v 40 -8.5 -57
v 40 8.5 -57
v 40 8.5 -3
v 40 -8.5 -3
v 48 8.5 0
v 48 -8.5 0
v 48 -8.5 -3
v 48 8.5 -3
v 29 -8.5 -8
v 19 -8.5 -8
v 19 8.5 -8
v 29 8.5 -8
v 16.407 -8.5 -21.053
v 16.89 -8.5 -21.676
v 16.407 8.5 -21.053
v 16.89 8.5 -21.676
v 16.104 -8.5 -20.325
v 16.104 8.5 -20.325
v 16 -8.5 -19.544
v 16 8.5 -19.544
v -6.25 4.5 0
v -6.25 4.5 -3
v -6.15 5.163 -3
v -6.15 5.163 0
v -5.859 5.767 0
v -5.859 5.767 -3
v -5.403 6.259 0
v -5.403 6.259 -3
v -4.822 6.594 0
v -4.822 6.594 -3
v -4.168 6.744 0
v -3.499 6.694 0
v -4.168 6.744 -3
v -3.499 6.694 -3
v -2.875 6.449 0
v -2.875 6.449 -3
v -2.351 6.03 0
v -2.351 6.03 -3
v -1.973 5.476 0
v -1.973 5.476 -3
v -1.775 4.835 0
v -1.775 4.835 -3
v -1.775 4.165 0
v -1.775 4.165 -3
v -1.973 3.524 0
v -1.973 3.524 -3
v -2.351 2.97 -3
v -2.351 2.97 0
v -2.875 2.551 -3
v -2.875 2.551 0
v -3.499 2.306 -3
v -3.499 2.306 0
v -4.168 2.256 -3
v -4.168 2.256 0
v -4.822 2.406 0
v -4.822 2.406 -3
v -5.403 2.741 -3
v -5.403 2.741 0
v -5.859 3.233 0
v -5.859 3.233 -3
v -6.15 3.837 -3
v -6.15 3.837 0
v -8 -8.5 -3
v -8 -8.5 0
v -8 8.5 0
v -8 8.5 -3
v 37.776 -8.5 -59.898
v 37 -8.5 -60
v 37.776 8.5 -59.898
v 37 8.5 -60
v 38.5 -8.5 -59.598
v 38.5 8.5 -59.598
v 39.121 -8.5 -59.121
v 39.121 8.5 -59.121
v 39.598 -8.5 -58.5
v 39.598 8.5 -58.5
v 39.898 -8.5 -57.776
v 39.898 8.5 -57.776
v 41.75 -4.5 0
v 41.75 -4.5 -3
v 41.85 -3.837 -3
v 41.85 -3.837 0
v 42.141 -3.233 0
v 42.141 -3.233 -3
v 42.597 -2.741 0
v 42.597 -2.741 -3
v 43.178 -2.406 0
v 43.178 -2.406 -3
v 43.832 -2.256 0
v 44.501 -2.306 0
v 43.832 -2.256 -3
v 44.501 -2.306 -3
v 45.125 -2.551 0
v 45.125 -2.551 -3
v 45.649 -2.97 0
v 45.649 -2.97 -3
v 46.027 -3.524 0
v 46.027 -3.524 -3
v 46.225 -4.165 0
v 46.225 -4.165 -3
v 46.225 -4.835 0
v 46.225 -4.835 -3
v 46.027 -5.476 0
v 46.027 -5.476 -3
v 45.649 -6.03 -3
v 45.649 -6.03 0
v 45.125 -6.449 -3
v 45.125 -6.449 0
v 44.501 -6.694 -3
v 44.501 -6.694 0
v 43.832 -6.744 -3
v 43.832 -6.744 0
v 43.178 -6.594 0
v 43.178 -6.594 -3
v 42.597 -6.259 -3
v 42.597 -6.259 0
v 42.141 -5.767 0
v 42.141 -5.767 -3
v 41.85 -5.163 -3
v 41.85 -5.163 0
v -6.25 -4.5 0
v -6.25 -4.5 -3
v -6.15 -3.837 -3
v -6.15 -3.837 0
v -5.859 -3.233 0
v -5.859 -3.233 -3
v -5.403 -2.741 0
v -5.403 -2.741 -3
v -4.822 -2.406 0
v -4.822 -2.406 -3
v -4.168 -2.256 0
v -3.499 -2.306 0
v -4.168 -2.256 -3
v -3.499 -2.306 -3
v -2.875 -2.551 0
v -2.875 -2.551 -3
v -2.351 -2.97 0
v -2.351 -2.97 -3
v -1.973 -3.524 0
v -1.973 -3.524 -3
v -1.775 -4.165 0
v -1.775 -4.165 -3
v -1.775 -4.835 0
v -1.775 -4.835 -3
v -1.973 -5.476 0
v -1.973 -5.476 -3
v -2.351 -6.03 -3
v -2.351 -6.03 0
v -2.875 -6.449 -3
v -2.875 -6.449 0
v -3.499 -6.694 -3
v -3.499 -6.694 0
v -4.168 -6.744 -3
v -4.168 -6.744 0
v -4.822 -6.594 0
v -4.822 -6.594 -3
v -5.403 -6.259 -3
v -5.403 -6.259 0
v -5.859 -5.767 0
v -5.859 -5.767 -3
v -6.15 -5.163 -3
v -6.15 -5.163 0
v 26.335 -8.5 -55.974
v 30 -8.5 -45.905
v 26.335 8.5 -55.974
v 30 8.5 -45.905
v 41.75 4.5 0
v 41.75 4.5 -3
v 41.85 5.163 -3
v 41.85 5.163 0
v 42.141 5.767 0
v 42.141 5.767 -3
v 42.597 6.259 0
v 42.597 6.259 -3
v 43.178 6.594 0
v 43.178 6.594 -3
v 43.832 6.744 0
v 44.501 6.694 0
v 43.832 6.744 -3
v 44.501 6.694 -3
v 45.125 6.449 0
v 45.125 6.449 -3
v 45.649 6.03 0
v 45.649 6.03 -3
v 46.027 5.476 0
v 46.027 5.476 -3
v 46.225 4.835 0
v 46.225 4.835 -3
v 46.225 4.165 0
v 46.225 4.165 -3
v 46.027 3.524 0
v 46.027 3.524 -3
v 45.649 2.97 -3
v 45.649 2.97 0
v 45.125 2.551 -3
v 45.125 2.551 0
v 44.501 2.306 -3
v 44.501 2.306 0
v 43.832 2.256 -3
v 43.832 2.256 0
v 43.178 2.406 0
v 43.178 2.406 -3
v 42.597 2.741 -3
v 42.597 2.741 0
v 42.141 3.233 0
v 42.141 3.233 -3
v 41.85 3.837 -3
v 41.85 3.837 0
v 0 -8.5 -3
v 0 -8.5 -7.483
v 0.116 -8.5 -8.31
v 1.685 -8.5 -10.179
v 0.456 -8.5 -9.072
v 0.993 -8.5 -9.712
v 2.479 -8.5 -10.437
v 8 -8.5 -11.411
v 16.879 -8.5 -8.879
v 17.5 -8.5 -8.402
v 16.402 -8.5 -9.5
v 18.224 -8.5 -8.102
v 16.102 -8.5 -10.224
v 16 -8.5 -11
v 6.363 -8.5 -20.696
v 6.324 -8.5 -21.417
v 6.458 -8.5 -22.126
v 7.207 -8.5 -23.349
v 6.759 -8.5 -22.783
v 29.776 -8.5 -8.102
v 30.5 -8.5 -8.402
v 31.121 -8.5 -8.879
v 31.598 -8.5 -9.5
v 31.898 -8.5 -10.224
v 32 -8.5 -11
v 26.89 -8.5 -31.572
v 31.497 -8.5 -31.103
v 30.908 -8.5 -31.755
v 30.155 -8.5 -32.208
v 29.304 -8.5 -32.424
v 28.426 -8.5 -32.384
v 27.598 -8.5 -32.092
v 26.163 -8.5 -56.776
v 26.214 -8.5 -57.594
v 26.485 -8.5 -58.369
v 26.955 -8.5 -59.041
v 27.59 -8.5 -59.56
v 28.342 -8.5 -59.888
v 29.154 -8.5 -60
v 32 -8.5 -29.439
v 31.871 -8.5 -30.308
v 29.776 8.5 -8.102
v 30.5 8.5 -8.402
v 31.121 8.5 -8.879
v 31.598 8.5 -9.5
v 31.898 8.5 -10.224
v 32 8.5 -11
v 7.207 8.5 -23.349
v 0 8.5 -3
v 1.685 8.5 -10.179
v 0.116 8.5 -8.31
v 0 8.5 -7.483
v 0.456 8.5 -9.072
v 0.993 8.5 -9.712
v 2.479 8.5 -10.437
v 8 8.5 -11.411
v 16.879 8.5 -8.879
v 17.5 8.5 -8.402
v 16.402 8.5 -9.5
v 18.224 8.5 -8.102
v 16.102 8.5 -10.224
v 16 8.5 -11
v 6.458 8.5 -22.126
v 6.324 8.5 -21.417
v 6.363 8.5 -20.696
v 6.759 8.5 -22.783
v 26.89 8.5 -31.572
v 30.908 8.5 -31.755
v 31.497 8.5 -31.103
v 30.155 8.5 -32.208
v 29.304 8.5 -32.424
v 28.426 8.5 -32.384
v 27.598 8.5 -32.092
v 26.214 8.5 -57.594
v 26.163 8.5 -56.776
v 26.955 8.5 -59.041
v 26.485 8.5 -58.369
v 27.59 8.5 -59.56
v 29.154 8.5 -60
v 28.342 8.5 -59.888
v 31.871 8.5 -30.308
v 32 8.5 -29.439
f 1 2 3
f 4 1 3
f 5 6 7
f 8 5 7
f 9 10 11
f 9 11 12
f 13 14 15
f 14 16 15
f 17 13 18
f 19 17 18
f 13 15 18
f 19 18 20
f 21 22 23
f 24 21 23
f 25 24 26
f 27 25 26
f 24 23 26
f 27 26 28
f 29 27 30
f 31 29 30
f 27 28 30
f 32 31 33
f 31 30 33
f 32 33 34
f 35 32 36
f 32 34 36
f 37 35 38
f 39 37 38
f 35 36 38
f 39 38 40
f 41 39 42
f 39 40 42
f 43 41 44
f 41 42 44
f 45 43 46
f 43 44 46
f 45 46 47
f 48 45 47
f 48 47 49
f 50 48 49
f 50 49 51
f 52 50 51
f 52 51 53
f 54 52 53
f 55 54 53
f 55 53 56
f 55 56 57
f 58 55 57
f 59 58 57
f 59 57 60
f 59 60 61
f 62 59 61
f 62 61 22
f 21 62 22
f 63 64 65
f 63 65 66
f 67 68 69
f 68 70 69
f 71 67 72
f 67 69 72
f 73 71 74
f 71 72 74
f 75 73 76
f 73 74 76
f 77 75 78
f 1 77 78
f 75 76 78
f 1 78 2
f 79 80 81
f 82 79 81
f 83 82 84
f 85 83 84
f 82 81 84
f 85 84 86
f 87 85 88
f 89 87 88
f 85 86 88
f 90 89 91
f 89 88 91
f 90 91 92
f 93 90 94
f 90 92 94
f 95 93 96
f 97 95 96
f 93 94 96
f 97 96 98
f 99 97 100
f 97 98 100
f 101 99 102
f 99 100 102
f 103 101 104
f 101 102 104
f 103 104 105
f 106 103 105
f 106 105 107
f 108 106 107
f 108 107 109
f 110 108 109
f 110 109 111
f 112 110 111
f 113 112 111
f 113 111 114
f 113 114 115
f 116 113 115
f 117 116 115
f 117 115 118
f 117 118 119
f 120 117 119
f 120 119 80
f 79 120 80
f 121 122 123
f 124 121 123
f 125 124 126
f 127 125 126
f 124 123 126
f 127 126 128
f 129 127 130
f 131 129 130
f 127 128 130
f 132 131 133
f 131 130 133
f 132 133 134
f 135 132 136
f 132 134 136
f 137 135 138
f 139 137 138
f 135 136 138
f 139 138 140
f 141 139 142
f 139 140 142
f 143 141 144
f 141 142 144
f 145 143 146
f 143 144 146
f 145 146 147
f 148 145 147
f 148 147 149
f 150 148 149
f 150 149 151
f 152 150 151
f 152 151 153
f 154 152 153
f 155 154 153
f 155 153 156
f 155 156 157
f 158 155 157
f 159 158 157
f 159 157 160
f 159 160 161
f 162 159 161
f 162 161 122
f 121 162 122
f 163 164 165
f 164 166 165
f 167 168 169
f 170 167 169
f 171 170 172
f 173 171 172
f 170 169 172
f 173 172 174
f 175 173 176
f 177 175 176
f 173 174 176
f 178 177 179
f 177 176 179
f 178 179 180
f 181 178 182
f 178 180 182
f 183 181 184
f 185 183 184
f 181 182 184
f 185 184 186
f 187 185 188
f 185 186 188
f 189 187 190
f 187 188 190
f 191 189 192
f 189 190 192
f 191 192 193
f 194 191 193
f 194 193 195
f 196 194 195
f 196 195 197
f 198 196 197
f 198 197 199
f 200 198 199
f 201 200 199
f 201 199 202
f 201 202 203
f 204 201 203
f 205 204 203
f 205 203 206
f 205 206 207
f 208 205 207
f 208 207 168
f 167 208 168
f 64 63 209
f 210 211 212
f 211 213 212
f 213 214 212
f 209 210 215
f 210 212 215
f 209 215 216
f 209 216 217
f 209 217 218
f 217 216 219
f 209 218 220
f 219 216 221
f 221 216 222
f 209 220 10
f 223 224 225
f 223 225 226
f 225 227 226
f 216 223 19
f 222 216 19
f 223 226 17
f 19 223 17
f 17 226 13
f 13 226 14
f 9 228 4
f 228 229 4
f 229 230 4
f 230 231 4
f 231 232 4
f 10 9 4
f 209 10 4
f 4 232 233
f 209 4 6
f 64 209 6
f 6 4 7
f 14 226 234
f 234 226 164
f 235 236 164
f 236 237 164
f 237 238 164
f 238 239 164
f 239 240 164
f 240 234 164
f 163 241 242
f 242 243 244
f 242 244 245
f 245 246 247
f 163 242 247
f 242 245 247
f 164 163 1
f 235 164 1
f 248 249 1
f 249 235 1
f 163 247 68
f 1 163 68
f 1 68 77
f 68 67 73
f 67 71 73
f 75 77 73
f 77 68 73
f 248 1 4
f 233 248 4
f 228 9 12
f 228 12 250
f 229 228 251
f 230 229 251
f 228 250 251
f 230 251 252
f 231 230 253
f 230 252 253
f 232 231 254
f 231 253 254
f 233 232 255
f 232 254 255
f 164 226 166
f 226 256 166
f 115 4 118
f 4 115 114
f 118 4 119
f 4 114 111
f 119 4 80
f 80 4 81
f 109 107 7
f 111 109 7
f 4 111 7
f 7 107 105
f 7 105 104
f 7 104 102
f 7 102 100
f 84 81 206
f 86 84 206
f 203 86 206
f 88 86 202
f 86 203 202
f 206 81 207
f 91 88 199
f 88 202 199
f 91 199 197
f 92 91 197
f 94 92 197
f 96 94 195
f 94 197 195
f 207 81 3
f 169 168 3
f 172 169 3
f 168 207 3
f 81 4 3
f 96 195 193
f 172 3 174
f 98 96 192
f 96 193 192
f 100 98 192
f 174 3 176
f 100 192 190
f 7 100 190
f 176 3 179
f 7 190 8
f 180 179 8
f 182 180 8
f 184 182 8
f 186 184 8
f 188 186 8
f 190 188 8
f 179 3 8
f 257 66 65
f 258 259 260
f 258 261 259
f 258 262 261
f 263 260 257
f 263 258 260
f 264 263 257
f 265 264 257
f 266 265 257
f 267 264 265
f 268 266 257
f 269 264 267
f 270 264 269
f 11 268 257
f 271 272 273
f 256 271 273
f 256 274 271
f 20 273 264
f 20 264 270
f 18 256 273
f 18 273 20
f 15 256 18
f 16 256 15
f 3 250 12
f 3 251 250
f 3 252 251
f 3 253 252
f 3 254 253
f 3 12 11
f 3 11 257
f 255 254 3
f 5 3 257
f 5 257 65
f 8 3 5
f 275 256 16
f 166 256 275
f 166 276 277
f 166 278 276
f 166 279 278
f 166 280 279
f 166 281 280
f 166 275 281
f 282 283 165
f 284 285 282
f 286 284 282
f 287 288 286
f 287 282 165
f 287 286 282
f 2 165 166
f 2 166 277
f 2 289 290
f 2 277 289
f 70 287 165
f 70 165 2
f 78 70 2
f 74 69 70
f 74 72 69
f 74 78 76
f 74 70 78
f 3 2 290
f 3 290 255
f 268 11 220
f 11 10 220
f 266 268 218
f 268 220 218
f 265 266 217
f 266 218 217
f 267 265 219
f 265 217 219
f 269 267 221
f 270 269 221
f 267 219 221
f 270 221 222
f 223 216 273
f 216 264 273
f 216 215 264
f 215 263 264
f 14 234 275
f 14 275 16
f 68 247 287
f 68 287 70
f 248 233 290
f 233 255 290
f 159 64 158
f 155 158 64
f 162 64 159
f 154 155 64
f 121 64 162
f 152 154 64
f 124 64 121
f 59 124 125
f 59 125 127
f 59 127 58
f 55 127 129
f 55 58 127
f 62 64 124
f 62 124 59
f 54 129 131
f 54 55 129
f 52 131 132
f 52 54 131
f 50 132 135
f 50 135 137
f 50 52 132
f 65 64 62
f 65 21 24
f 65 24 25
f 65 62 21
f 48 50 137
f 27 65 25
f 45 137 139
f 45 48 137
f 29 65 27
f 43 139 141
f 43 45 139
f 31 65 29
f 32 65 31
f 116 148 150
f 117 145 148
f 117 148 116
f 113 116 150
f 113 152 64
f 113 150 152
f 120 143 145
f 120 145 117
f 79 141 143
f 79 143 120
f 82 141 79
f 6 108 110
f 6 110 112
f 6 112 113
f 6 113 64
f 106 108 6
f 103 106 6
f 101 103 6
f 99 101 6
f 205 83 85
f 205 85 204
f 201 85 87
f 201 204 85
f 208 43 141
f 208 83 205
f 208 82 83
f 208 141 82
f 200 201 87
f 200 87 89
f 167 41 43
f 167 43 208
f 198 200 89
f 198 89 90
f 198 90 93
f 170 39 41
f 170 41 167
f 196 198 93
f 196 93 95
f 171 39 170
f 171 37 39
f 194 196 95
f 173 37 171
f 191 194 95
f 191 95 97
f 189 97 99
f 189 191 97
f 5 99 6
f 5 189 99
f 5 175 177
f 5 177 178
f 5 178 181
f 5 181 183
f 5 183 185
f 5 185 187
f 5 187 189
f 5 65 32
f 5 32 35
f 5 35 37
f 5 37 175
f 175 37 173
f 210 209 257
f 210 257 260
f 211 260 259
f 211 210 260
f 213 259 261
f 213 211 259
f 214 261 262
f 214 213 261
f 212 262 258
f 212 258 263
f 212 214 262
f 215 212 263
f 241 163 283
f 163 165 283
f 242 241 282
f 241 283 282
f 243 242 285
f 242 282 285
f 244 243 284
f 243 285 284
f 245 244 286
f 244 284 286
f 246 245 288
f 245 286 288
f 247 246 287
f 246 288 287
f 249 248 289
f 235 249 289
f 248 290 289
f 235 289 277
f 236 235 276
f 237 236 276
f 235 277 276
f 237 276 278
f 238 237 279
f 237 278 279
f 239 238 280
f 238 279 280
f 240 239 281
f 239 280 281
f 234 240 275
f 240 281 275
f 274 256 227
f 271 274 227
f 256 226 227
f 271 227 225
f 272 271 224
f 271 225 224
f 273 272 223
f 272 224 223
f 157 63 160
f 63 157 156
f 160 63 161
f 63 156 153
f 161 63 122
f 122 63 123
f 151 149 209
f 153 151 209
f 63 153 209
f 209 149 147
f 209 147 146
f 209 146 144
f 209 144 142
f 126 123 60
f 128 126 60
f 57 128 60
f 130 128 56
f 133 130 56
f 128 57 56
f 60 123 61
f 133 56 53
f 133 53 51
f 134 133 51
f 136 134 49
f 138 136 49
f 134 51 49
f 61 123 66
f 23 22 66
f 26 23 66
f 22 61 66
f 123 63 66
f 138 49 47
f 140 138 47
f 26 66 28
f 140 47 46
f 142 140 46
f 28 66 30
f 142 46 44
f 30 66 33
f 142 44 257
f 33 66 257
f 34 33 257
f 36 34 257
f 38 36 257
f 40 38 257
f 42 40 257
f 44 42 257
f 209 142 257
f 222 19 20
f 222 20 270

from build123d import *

# Parameters (mm, degrees)
BOSS_EXTRUDE1_DEPTH = 8.5
FILLET1_R           = 3
SKETCH2_W           = 8
SKETCH2_H           = 3
BOSS_EXTRUDE2_DEPTH = 17
SKETCH3_R           = 2.25
CUT_EXTRUDE1_DEPTH  = 4


with BuildPart() as part:
    # Sketch1 → Boss-Extrude1 (new body, symmetric)
    with BuildSketch(Plane(origin=(0, 0, 0), x_dir=(1, 0, 0), z_dir=(0, 1, 0))):
        Polygon((0, 0), (0, 10), (8, 11.410615846), (6.089870046, 22.243501129), (30, 45.904610688), (24.86969785, 60), (40, 60), (40, 0), align=None)
        Polygon((16, 8), (32, 8), (32, 36.628833574), (16, 20.795471159), align=None, mode=Mode.SUBTRACT)
    extrude(amount=BOSS_EXTRUDE1_DEPTH, both=True)

    # Fillet1
    fillet1_edges = [part.edges().sort_by_distance(p)[0] for p in [
        (0, 0, -10),
        (6.089870046, 0, -22.243501129),
        (24.86969785, 0, -60),
        (40, 0, -60),
        (16, 0, -20.795471159),
        (16, 0, -8),
        (32, 0, -8),
        (32, 0, -36.628833574),
    ]]
    fillet(fillet1_edges, radius=FILLET1_R)

    # Sketch2 → Boss-Extrude2 (add)
    with BuildSketch(Plane(origin=(0, 8.5, 0), x_dir=(1, 0, 0), z_dir=(0, 1, 0))):
        with Locations((-4, 1.5)):
            Rectangle(SKETCH2_W, SKETCH2_H)
        with Locations((44, 1.5)):
            Rectangle(SKETCH2_W, SKETCH2_H)
    extrude(amount=-BOSS_EXTRUDE2_DEPTH)

    # Sketch3 → Cut-Extrude1 (cut, through all)
    with BuildSketch(Plane(origin=(0, 0, -3), x_dir=(-1, 0, 0), z_dir=(0, 0, -1))):
        with Locations((4, -4.5)):
            Circle(SKETCH3_R)
        with Locations((4, 4.5)):
            Circle(SKETCH3_R)
        with Locations((-44, 4.5)):
            Circle(SKETCH3_R)
        with Locations((-44, -4.5)):
            Circle(SKETCH3_R)
    extrude(amount=-CUT_EXTRUDE1_DEPTH, mode=Mode.SUBTRACT)


solid = part.part
